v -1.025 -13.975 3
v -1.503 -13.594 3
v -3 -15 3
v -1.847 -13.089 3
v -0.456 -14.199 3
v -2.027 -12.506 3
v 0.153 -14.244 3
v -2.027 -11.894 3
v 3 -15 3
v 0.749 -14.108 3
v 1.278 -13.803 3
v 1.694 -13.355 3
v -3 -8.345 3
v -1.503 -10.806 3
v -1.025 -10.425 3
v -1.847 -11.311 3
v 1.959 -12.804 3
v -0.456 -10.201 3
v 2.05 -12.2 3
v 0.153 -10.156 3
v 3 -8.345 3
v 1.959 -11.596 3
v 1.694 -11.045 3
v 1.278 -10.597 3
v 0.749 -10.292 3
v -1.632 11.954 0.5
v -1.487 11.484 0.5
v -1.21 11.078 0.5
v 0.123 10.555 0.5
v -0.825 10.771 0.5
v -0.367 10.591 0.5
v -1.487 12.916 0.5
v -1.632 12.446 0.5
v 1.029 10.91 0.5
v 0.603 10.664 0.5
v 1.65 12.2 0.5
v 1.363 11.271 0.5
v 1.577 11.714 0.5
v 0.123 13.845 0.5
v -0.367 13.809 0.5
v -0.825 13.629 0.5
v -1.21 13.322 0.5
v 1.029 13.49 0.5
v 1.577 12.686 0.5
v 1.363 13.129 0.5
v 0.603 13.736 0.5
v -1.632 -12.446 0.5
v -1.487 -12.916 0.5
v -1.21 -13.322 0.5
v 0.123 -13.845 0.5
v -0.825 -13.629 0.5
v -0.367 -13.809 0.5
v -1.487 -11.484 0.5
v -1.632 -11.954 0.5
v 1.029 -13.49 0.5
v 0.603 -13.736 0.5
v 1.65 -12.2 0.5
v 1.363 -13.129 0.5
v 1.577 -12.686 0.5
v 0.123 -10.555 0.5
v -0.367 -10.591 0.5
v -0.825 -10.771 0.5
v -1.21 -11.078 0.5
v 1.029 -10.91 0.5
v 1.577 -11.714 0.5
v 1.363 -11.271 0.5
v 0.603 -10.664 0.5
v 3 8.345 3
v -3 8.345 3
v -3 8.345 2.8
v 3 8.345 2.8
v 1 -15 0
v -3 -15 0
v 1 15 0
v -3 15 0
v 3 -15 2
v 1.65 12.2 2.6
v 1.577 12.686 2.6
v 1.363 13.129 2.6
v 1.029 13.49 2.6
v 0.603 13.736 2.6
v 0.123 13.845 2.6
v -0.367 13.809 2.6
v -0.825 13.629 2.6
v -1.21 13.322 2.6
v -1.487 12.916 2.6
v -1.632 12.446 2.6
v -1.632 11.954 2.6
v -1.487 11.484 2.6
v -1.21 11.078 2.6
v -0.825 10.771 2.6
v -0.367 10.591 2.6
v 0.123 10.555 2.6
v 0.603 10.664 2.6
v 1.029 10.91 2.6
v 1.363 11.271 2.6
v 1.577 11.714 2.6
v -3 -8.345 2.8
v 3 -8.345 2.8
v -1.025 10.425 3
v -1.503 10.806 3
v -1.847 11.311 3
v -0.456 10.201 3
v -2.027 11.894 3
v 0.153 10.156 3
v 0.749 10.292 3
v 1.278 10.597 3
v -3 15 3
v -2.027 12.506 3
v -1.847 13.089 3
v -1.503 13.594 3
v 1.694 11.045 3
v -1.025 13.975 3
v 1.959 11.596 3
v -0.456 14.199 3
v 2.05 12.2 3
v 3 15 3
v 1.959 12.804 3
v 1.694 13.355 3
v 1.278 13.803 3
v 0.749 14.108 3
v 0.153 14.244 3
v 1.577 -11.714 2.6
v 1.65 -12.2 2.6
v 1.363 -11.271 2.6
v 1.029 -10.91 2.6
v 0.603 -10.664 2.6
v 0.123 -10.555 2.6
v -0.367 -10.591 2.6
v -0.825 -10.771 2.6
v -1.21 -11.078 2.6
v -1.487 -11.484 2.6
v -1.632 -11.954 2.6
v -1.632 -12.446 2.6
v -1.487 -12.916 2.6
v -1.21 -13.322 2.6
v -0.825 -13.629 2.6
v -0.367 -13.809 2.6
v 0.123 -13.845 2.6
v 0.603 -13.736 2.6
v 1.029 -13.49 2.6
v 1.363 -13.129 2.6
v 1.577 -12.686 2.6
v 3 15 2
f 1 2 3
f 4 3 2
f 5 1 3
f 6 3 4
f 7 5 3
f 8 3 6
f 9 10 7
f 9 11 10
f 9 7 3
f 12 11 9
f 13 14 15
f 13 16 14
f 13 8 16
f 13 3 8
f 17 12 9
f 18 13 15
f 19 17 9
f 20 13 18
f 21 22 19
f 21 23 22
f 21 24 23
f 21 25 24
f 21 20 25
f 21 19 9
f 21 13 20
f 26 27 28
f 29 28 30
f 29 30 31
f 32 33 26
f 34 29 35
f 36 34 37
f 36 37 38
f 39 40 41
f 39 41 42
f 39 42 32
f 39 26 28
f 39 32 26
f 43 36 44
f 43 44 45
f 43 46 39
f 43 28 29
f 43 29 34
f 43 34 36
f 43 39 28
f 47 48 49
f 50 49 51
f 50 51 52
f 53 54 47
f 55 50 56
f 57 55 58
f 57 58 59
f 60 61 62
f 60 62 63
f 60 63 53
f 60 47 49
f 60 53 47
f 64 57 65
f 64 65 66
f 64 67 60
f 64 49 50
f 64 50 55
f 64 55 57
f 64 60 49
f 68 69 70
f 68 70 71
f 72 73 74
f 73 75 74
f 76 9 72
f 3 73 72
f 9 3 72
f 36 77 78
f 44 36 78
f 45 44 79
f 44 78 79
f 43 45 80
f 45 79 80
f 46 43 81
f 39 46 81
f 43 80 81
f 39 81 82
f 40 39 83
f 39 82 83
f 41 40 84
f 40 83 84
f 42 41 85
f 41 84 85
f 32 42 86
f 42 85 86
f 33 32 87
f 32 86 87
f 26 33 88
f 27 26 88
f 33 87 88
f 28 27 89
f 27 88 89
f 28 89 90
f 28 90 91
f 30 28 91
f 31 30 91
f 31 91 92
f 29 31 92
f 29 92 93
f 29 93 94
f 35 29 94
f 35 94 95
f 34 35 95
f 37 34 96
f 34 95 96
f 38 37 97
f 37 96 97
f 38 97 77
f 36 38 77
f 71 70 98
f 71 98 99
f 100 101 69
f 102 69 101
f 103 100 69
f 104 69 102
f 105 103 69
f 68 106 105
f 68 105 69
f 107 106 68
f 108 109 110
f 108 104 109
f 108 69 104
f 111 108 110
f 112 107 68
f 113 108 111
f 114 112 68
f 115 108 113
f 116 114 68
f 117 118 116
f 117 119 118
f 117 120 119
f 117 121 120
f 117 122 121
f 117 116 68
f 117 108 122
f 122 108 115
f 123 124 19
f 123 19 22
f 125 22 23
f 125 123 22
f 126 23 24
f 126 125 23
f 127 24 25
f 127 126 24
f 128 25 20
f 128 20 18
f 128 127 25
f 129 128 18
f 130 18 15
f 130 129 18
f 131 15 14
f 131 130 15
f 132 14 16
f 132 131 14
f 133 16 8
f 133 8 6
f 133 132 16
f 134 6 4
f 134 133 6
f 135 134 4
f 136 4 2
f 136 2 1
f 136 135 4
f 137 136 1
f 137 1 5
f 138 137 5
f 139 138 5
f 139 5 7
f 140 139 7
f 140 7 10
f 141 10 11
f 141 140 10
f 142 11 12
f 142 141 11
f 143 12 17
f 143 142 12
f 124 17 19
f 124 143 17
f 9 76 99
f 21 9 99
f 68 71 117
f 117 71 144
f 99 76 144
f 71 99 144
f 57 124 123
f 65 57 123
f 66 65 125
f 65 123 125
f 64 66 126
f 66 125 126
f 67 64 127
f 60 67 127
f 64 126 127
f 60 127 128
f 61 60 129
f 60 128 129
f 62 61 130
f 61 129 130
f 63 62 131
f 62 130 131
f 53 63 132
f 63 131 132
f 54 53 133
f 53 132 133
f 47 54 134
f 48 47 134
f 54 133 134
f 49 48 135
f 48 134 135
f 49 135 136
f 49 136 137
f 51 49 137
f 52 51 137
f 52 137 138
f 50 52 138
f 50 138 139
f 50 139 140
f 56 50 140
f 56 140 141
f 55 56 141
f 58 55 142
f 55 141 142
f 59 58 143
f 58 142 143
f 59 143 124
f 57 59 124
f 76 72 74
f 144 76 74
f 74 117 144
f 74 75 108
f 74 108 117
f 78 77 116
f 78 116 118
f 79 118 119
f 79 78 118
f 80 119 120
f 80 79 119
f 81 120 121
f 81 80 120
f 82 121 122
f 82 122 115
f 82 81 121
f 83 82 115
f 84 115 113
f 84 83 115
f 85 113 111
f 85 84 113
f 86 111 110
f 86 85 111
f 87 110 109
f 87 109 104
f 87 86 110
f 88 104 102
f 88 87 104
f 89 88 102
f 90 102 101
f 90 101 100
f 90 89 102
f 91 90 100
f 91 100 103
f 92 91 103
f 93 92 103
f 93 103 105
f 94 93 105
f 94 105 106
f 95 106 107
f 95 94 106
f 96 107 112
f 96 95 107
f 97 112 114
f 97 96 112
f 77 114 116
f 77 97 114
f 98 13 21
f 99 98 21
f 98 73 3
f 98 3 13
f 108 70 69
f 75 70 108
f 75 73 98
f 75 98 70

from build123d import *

# Parameters (mm, degrees)
SKETCH_W        = 6
SKETCH_H        = 30
PAD_DEPTH       = 3
SKETCH001_R     = 1.65
POCKET_DEPTH    = 2.5
CHAMFER_SIZE    = 0.4
SKETCH002_W     = 9.60586
SKETCH002_H     = 16.689732
POCKET001_DEPTH = 0.2
CHAMFER001_SIZE = 2


with BuildPart() as part:
    # Sketch → Pad (new body)
    with BuildSketch(Plane.XY):
        Rectangle(SKETCH_W, SKETCH_H)
    extrude(amount=PAD_DEPTH)

    # Sketch001 (on Face6 of Pad) → Pocket (cut)
    with BuildSketch(Plane.XY.offset(3)):
        with Locations((0, 12.2)):
            Circle(SKETCH001_R)
        with Locations((0, -12.2)):
            Circle(SKETCH001_R)
    extrude(amount=-POCKET_DEPTH, mode=Mode.SUBTRACT)

    # Chamfer
    chamfer_edges = [part.edges().sort_by_distance(p)[0] for p in [
        (-1.65, 12.2, 3),
        (-1.65, -12.2, 3),
    ]]
    chamfer(chamfer_edges, length=CHAMFER_SIZE)

    # Sketch002 (on Face1 of Chamfer) → Pocket001 (cut)
    with BuildSketch(Plane.XY.offset(3)):
        Rectangle(SKETCH002_W, SKETCH002_H)
    extrude(amount=-POCKET001_DEPTH, mode=Mode.SUBTRACT)

    # Chamfer001
    chamfer001_edges = [part.edges().sort_by_distance(p)[0] for p in [
        (3, 0, 0),
    ]]
    chamfer(chamfer001_edges, length=CHAMFER001_SIZE)


solid = part.part
